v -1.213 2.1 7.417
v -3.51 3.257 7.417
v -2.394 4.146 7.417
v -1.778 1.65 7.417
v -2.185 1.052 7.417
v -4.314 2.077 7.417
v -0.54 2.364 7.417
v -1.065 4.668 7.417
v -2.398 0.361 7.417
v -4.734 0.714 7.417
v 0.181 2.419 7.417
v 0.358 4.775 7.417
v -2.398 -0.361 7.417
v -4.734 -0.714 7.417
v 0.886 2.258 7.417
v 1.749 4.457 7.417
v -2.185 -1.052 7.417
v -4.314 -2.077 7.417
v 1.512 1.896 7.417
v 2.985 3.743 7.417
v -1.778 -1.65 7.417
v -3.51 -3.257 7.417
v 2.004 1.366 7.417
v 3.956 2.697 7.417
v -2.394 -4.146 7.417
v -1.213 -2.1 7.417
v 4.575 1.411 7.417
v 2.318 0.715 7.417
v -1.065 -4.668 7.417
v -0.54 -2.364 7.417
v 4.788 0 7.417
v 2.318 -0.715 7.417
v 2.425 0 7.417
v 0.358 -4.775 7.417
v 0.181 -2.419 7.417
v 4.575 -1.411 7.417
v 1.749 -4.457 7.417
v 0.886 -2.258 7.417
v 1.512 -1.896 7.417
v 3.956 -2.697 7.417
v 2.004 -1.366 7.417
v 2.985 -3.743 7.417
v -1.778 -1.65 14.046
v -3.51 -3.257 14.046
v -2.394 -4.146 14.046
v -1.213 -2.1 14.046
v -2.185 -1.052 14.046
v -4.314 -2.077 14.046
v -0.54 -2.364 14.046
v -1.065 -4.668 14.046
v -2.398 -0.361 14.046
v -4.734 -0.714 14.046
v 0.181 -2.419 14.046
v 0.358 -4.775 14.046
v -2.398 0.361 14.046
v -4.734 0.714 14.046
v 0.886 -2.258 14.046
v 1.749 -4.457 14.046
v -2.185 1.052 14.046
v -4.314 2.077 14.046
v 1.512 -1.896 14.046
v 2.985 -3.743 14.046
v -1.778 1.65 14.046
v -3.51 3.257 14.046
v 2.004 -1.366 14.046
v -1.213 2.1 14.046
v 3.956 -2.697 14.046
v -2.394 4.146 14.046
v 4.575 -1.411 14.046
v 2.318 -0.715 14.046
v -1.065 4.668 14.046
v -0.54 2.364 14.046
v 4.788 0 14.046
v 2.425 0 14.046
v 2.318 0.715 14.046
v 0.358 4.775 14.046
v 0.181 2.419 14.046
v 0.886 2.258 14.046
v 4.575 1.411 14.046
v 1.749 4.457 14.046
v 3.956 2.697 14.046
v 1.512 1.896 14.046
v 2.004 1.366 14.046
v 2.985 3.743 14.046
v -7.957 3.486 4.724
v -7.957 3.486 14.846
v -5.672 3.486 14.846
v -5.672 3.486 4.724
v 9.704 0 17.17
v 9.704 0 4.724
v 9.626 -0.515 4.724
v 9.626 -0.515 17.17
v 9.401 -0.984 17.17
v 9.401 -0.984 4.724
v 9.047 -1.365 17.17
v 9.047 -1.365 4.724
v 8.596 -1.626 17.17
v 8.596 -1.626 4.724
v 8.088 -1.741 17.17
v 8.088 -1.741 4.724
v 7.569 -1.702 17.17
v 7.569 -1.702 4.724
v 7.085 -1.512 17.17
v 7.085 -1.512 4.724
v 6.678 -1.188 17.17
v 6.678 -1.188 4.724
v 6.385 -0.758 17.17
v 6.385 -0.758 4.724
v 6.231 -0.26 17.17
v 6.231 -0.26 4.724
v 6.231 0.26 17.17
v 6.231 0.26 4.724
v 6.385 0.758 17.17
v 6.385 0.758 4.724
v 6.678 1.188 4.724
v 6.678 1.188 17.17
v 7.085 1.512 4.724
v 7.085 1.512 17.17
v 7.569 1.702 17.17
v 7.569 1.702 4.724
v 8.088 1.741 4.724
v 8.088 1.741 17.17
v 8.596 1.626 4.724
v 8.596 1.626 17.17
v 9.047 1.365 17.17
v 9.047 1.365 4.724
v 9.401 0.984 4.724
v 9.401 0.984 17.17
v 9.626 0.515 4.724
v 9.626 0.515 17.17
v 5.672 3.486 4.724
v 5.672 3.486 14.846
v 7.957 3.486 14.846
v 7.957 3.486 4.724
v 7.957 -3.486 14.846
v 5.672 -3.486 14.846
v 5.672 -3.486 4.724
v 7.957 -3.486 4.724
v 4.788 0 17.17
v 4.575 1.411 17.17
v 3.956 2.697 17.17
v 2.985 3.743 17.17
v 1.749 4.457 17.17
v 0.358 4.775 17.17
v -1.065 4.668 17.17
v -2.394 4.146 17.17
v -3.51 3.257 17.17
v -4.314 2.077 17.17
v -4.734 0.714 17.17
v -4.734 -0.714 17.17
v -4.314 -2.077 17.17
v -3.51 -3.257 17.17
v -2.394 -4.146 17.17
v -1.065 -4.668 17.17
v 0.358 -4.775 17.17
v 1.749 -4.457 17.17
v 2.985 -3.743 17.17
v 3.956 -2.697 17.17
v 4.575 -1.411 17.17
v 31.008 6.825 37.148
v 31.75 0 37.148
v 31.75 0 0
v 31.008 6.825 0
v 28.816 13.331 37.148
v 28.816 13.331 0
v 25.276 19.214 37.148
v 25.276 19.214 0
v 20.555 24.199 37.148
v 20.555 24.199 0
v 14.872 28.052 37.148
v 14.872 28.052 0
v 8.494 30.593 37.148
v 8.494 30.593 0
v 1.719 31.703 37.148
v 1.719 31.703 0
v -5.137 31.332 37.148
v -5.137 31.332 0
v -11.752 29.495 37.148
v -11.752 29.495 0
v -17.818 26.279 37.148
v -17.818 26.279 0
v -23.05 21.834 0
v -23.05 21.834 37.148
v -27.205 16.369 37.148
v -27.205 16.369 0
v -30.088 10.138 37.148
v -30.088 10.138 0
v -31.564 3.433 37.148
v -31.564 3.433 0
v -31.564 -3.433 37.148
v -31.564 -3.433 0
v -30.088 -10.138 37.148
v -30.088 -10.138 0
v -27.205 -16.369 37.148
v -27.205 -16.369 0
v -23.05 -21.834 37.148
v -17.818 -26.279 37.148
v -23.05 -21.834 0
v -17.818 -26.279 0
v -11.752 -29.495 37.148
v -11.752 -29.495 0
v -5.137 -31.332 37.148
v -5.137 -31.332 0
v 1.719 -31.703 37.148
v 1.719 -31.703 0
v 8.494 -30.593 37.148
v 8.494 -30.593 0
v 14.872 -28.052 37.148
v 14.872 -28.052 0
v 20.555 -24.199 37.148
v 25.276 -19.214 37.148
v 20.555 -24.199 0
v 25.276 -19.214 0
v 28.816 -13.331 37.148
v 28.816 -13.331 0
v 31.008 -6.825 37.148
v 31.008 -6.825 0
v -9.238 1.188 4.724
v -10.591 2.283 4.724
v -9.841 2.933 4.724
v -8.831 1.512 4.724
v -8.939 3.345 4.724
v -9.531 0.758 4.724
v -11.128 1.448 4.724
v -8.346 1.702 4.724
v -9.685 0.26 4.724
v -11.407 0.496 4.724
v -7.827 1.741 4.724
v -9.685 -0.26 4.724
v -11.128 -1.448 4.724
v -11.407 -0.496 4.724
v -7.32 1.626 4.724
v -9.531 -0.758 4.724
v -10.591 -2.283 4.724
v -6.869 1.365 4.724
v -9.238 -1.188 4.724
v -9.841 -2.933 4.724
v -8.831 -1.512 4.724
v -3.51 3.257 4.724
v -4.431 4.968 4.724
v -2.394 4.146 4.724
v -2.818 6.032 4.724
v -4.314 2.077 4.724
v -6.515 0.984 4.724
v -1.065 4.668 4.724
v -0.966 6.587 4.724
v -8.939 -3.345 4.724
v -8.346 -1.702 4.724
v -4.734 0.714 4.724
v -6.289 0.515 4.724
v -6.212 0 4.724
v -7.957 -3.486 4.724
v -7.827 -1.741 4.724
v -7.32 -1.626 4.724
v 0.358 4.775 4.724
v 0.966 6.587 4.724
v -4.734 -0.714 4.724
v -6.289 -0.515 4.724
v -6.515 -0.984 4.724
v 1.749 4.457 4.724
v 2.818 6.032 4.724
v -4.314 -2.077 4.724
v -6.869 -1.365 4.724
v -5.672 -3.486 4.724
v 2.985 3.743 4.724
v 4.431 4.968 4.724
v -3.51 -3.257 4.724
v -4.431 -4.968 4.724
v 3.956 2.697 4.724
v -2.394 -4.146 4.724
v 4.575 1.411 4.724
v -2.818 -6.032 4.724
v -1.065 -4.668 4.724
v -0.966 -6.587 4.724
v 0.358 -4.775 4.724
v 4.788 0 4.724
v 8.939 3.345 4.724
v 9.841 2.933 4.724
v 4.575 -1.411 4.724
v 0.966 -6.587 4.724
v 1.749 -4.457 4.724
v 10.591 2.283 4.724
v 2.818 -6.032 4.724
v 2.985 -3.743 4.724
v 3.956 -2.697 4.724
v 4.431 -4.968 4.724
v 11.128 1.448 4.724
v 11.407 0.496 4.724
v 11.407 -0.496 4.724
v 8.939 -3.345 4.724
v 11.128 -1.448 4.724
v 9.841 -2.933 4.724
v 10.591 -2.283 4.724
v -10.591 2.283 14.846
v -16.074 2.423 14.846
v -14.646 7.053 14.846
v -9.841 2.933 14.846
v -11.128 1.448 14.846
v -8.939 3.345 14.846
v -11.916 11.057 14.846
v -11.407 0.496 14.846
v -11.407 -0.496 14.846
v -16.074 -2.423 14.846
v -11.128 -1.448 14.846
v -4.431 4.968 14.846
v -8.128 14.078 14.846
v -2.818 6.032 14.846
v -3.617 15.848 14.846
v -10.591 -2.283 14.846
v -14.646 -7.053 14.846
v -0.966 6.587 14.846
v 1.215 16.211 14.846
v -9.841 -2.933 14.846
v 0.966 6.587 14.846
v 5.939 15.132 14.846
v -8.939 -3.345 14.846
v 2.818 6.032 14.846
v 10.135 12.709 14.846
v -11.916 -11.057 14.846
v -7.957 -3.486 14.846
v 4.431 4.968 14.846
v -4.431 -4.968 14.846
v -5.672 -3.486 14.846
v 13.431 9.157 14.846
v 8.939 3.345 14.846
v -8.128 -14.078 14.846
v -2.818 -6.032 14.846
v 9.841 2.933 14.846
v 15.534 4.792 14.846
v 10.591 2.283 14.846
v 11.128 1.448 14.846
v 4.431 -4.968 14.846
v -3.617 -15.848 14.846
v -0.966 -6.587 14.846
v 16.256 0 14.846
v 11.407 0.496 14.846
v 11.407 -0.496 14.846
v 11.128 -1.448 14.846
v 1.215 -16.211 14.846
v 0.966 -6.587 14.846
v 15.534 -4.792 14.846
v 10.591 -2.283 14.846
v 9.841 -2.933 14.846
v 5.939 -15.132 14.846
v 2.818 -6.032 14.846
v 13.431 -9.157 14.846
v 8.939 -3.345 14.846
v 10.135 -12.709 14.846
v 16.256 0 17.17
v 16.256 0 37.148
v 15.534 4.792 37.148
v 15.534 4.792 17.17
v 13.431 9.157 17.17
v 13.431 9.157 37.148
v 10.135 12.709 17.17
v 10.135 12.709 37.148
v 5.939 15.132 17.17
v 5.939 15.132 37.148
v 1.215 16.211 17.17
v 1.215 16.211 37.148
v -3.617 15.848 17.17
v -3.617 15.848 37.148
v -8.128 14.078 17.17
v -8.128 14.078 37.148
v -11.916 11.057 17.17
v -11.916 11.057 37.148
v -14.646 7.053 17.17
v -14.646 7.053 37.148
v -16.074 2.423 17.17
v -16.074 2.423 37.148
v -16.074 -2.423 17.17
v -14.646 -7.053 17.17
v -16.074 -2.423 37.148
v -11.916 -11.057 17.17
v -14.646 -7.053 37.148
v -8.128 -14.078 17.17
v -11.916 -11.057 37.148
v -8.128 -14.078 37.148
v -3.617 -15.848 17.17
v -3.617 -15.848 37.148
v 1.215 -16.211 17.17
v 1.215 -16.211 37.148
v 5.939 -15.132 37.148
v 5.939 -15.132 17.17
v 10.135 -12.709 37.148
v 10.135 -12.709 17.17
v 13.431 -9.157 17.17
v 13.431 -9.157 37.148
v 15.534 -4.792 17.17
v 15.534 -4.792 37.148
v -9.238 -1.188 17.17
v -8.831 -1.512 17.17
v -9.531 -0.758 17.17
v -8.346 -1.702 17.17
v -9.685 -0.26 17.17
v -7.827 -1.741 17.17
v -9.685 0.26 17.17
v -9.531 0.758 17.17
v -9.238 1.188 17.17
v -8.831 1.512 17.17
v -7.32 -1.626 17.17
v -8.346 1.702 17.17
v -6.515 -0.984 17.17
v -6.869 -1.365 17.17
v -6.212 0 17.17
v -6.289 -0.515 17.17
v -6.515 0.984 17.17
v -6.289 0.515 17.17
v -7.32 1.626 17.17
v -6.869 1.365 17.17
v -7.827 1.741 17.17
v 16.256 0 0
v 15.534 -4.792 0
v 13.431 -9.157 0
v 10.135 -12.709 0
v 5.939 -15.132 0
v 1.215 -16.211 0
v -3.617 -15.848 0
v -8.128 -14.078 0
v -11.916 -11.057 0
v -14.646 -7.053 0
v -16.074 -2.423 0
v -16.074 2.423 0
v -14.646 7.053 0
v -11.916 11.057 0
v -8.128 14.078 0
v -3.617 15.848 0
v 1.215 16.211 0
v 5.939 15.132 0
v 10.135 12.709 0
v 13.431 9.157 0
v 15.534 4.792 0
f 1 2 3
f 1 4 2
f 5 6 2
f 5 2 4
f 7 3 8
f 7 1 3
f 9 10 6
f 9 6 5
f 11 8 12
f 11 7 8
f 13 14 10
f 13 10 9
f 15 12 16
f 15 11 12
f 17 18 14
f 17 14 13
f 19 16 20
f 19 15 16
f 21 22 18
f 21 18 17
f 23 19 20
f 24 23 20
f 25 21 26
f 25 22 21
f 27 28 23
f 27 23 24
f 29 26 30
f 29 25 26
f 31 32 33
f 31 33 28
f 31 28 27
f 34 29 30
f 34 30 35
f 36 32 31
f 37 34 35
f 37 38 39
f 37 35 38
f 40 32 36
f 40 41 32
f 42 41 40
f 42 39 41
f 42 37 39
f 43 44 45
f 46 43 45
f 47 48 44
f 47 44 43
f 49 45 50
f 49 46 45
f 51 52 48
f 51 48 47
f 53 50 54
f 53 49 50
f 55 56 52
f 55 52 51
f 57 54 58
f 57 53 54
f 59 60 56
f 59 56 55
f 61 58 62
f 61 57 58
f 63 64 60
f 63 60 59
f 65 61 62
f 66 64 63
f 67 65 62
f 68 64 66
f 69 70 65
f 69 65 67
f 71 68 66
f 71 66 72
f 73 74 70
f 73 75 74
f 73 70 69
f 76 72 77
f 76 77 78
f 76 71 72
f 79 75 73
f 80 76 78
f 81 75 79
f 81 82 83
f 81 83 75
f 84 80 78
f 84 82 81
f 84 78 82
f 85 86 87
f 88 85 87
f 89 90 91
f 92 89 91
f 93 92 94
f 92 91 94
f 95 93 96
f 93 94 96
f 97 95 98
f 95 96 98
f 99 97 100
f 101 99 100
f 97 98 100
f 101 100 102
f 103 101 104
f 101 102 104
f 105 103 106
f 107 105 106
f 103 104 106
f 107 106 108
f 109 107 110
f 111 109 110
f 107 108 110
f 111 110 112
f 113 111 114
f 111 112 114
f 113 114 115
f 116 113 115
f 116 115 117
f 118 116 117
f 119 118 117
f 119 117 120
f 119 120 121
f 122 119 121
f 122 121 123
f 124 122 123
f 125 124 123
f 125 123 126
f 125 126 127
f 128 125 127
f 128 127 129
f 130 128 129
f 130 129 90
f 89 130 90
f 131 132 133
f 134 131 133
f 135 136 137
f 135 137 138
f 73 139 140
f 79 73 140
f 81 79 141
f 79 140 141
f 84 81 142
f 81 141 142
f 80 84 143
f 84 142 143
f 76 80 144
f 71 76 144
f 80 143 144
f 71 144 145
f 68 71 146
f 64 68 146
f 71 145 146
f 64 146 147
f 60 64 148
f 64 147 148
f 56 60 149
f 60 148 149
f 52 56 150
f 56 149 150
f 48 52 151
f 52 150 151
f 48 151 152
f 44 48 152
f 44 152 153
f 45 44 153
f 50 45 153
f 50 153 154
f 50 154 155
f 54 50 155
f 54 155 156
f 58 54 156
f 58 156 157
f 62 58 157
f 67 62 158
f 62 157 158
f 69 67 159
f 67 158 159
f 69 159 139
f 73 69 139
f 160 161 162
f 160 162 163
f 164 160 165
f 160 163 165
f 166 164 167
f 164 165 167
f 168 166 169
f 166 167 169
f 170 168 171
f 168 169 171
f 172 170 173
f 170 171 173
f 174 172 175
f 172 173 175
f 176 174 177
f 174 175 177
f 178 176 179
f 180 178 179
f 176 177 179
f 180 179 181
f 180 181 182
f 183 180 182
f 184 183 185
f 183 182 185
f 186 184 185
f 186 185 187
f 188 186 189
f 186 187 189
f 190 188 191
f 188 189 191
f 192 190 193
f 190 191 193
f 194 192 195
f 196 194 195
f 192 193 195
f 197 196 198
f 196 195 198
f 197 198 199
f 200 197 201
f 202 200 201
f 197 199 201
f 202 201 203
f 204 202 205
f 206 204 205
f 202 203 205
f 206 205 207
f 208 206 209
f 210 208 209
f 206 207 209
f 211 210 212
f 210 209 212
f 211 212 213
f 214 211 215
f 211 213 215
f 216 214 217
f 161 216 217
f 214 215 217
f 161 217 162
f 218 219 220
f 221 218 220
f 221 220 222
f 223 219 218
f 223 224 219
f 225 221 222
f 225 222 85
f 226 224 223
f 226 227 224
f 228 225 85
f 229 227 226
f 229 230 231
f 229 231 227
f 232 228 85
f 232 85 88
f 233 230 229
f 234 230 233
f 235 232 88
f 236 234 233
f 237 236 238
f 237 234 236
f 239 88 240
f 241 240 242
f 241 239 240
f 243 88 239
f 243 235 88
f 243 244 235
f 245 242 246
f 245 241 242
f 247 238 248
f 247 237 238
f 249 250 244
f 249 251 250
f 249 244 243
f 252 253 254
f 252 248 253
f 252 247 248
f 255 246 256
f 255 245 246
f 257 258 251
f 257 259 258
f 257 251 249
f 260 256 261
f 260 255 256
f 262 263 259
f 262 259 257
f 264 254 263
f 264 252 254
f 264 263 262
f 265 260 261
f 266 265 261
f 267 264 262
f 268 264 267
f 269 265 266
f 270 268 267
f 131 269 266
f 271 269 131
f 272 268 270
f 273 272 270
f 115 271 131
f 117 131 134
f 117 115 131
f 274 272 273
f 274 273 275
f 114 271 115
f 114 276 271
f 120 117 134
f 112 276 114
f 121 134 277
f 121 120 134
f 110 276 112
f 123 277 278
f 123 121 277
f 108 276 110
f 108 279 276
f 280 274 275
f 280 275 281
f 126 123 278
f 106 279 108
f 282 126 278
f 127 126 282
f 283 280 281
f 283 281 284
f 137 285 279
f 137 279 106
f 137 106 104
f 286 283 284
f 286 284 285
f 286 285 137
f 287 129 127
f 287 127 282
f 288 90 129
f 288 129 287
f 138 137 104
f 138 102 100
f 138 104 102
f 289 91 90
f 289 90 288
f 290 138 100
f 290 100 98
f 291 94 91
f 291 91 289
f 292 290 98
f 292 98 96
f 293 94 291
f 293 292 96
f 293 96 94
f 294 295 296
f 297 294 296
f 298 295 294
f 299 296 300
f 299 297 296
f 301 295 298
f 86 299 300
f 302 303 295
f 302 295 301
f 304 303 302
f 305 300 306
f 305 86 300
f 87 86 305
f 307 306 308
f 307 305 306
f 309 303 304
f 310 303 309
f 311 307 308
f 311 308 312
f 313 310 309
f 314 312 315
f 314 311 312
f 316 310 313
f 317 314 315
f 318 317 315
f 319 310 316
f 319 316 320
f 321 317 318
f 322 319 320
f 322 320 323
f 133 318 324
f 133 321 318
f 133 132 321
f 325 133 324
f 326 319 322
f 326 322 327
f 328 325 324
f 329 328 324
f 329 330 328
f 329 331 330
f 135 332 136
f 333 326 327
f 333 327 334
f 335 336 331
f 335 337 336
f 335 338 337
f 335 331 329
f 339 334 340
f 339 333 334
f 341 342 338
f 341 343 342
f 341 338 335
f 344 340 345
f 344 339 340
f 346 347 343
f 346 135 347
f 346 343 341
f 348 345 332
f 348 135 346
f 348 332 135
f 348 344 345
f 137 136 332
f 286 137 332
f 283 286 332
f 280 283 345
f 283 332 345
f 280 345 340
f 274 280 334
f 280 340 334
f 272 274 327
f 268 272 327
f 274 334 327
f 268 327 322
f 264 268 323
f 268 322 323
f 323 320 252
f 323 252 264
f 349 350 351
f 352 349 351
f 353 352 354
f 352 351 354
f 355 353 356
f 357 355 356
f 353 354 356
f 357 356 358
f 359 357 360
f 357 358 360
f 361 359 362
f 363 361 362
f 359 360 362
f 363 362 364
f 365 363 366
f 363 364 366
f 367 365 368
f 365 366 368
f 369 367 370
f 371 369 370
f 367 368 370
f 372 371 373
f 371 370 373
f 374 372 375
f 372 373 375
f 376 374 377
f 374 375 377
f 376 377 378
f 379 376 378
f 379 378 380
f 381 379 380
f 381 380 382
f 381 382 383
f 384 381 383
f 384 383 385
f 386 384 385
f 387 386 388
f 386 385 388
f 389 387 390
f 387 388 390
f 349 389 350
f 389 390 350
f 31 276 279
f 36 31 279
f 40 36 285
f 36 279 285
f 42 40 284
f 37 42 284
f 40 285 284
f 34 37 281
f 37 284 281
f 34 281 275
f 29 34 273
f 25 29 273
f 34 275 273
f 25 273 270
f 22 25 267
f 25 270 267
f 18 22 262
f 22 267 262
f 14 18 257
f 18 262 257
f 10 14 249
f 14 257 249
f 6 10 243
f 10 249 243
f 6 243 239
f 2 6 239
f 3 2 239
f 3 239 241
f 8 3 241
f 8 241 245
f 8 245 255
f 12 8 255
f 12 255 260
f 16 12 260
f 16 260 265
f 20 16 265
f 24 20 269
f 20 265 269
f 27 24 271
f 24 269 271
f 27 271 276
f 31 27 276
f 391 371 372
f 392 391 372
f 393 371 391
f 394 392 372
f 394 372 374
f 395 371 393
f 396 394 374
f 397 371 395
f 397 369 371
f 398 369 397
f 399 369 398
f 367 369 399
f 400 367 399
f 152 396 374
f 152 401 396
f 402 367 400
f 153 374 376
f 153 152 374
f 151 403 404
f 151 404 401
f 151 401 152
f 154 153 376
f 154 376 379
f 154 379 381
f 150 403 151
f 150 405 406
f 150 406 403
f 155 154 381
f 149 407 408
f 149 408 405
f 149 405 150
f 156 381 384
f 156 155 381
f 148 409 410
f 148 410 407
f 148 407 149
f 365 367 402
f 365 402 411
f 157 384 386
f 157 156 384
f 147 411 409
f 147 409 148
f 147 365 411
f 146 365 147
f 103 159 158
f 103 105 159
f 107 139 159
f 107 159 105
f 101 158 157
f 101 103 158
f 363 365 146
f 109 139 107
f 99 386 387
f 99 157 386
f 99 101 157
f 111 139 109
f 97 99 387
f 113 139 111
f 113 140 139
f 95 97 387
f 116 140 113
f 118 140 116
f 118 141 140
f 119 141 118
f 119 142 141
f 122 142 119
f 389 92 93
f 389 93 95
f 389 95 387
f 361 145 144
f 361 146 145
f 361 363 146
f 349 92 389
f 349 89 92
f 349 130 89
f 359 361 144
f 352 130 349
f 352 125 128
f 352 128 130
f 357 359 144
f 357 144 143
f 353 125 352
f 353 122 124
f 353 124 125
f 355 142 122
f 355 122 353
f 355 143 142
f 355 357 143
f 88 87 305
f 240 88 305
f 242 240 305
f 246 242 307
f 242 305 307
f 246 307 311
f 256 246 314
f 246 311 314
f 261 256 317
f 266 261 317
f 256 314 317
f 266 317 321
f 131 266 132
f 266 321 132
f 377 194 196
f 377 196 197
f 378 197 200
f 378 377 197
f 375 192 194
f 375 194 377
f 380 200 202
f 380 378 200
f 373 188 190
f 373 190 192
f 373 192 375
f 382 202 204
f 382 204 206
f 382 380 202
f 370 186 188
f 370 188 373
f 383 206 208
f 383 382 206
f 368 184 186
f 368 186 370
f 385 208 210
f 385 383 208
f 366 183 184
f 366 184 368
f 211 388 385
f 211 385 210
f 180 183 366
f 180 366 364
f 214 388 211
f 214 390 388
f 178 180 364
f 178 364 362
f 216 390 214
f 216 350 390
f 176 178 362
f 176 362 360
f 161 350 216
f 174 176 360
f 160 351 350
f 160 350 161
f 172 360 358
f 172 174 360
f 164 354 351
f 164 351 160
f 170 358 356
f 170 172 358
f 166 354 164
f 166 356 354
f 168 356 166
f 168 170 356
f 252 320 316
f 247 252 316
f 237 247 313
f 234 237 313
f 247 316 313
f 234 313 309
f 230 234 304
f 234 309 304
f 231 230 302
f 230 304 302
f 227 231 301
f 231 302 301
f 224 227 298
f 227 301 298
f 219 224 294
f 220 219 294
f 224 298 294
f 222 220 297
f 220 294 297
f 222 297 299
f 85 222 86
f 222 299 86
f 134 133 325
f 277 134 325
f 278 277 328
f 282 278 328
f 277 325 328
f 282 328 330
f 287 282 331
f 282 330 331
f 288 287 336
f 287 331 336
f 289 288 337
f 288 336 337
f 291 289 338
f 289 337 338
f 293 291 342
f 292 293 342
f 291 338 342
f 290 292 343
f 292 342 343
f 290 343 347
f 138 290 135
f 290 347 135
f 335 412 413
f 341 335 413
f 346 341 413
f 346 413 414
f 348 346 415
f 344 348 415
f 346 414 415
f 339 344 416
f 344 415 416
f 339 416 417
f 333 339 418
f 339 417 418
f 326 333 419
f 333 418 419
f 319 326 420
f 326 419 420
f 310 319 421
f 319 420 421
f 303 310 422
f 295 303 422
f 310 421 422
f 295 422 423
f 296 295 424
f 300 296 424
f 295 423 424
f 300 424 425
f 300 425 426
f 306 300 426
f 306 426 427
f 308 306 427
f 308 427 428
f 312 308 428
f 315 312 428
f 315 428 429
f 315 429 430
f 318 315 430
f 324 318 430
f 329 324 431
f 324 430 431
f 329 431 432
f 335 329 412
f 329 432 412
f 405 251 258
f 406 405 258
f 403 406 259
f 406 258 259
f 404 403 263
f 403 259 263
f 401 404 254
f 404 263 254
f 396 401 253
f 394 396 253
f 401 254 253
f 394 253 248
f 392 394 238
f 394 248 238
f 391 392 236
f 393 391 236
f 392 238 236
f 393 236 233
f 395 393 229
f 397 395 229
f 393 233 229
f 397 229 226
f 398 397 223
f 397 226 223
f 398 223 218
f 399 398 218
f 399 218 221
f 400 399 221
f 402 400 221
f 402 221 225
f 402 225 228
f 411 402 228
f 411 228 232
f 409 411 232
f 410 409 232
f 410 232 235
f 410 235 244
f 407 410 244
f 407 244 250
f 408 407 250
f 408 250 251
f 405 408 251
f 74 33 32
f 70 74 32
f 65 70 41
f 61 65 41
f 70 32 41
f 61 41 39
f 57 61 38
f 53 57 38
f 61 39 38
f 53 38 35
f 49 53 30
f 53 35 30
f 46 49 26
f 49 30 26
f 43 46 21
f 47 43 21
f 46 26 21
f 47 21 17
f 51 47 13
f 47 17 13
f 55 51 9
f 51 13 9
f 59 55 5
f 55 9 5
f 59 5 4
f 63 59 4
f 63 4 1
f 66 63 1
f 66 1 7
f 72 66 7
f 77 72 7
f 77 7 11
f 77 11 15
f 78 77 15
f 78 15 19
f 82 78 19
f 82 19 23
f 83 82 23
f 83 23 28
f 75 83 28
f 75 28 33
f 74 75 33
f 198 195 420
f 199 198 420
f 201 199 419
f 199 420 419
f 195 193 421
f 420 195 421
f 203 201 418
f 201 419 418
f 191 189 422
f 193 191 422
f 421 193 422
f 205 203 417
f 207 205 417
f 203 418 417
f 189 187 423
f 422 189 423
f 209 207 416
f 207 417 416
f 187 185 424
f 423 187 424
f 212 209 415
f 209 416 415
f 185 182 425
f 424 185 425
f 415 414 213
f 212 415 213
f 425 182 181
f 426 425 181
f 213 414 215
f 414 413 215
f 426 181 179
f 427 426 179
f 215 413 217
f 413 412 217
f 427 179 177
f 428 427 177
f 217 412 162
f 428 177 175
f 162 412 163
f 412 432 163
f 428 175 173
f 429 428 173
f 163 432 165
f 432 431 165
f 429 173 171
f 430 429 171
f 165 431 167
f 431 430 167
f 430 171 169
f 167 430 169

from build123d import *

# Parameters (mm, degrees)
SKETCH_R        = 31.75
PAD_DEPTH       = 37.1475
SKETCH001_R     = 16.256
POCKET_DEPTH    = 19.9771
SKETCH002_R     = 16.256
POCKET001_DEPTH = 14.8463
PAD001_DEPTH    = 10.1219
SKETCH004_R     = 1.74625
POCKET002_DEPTH = 32.4241
SKETCH005_R     = 4.7879
POCKET003_DEPTH = 2.6924
SKETCH006_R     = 2.425304
POCKET004_DEPTH = 29.7317
SKETCH007_R     = 4.7879
POCKET005_DEPTH = 3.1242


with BuildPart() as part:
    # Sketch → Pad (new body)
    with BuildSketch(Plane.XY):
        Circle(SKETCH_R)
    extrude(amount=PAD_DEPTH)

    # Sketch001 → Pocket (cut)
    with BuildSketch(Plane.XY.offset(37.1475)):
        Circle(SKETCH001_R)
    extrude(amount=-POCKET_DEPTH, mode=Mode.SUBTRACT)

    # Sketch002 → Pocket001 (cut)
    with BuildSketch(Plane(origin=(0, 0, 0), x_dir=(1, 0, 0), z_dir=(0, 0, -1))):
        Circle(SKETCH002_R)
    extrude(amount=-POCKET001_DEPTH, mode=Mode.SUBTRACT)

    # Sketch003 → Pad001 (new body)
    with BuildSketch(Plane(origin=(0, 0, 14.8463), x_dir=(1, 0, 0), z_dir=(0, 0, -1))):
        with BuildLine():
            ThreePointArc((-5.67159, -3.48615), (0, -6.65734), (5.67159, -3.48615))
            Line((5.67159, -3.48615), (7.95655, -3.48615))
            ThreePointArc((7.95655, -3.48615), (11.4427, 0), (7.95655, 3.48615))
            Line((5.67159, 3.48615), (7.95655, 3.48615))
            ThreePointArc((5.67159, 3.48615), (0, 6.65734), (-5.67159, 3.48615))
            Line((-7.95655, 3.48615), (-5.67159, 3.48615))
            ThreePointArc((-7.95655, 3.48615), (-11.4427, 0), (-7.95655, -3.48615))
            Line((-7.95655, -3.48615), (-5.67159, -3.48615))
        make_face()
    extrude(amount=PAD001_DEPTH)

    # Sketch004 → Pocket002 (cut, through all)
    with BuildSketch(Plane(origin=(0, 0, 4.7244), x_dir=(1, 0, 0), z_dir=(0, 0, -1))):
        with Locations((7.95782, 0)):
            Circle(SKETCH004_R)
        with Locations((-7.95782, 0)):
            Circle(SKETCH004_R)
    extrude(amount=-POCKET002_DEPTH, mode=Mode.SUBTRACT)

    # Sketch005 → Pocket003 (cut)
    with BuildSketch(Plane(origin=(0, 0, 4.7244), x_dir=(1, 0, 0), z_dir=(0, 0, -1))):
        Circle(SKETCH005_R)
    extrude(amount=-POCKET003_DEPTH, mode=Mode.SUBTRACT)

    # Sketch006 → Pocket004 (cut, through all)
    with BuildSketch(Plane(origin=(0, 0, 7.4168), x_dir=(1, 0, 0), z_dir=(0, 0, -1))):
        Circle(SKETCH006_R)
    extrude(amount=-POCKET004_DEPTH, mode=Mode.SUBTRACT)

    # Sketch007 → Pocket005 (cut)
    with BuildSketch(Plane.XY.offset(17.1704)):
        Circle(SKETCH007_R)
    extrude(amount=-POCKET005_DEPTH, mode=Mode.SUBTRACT)


solid = part.part
